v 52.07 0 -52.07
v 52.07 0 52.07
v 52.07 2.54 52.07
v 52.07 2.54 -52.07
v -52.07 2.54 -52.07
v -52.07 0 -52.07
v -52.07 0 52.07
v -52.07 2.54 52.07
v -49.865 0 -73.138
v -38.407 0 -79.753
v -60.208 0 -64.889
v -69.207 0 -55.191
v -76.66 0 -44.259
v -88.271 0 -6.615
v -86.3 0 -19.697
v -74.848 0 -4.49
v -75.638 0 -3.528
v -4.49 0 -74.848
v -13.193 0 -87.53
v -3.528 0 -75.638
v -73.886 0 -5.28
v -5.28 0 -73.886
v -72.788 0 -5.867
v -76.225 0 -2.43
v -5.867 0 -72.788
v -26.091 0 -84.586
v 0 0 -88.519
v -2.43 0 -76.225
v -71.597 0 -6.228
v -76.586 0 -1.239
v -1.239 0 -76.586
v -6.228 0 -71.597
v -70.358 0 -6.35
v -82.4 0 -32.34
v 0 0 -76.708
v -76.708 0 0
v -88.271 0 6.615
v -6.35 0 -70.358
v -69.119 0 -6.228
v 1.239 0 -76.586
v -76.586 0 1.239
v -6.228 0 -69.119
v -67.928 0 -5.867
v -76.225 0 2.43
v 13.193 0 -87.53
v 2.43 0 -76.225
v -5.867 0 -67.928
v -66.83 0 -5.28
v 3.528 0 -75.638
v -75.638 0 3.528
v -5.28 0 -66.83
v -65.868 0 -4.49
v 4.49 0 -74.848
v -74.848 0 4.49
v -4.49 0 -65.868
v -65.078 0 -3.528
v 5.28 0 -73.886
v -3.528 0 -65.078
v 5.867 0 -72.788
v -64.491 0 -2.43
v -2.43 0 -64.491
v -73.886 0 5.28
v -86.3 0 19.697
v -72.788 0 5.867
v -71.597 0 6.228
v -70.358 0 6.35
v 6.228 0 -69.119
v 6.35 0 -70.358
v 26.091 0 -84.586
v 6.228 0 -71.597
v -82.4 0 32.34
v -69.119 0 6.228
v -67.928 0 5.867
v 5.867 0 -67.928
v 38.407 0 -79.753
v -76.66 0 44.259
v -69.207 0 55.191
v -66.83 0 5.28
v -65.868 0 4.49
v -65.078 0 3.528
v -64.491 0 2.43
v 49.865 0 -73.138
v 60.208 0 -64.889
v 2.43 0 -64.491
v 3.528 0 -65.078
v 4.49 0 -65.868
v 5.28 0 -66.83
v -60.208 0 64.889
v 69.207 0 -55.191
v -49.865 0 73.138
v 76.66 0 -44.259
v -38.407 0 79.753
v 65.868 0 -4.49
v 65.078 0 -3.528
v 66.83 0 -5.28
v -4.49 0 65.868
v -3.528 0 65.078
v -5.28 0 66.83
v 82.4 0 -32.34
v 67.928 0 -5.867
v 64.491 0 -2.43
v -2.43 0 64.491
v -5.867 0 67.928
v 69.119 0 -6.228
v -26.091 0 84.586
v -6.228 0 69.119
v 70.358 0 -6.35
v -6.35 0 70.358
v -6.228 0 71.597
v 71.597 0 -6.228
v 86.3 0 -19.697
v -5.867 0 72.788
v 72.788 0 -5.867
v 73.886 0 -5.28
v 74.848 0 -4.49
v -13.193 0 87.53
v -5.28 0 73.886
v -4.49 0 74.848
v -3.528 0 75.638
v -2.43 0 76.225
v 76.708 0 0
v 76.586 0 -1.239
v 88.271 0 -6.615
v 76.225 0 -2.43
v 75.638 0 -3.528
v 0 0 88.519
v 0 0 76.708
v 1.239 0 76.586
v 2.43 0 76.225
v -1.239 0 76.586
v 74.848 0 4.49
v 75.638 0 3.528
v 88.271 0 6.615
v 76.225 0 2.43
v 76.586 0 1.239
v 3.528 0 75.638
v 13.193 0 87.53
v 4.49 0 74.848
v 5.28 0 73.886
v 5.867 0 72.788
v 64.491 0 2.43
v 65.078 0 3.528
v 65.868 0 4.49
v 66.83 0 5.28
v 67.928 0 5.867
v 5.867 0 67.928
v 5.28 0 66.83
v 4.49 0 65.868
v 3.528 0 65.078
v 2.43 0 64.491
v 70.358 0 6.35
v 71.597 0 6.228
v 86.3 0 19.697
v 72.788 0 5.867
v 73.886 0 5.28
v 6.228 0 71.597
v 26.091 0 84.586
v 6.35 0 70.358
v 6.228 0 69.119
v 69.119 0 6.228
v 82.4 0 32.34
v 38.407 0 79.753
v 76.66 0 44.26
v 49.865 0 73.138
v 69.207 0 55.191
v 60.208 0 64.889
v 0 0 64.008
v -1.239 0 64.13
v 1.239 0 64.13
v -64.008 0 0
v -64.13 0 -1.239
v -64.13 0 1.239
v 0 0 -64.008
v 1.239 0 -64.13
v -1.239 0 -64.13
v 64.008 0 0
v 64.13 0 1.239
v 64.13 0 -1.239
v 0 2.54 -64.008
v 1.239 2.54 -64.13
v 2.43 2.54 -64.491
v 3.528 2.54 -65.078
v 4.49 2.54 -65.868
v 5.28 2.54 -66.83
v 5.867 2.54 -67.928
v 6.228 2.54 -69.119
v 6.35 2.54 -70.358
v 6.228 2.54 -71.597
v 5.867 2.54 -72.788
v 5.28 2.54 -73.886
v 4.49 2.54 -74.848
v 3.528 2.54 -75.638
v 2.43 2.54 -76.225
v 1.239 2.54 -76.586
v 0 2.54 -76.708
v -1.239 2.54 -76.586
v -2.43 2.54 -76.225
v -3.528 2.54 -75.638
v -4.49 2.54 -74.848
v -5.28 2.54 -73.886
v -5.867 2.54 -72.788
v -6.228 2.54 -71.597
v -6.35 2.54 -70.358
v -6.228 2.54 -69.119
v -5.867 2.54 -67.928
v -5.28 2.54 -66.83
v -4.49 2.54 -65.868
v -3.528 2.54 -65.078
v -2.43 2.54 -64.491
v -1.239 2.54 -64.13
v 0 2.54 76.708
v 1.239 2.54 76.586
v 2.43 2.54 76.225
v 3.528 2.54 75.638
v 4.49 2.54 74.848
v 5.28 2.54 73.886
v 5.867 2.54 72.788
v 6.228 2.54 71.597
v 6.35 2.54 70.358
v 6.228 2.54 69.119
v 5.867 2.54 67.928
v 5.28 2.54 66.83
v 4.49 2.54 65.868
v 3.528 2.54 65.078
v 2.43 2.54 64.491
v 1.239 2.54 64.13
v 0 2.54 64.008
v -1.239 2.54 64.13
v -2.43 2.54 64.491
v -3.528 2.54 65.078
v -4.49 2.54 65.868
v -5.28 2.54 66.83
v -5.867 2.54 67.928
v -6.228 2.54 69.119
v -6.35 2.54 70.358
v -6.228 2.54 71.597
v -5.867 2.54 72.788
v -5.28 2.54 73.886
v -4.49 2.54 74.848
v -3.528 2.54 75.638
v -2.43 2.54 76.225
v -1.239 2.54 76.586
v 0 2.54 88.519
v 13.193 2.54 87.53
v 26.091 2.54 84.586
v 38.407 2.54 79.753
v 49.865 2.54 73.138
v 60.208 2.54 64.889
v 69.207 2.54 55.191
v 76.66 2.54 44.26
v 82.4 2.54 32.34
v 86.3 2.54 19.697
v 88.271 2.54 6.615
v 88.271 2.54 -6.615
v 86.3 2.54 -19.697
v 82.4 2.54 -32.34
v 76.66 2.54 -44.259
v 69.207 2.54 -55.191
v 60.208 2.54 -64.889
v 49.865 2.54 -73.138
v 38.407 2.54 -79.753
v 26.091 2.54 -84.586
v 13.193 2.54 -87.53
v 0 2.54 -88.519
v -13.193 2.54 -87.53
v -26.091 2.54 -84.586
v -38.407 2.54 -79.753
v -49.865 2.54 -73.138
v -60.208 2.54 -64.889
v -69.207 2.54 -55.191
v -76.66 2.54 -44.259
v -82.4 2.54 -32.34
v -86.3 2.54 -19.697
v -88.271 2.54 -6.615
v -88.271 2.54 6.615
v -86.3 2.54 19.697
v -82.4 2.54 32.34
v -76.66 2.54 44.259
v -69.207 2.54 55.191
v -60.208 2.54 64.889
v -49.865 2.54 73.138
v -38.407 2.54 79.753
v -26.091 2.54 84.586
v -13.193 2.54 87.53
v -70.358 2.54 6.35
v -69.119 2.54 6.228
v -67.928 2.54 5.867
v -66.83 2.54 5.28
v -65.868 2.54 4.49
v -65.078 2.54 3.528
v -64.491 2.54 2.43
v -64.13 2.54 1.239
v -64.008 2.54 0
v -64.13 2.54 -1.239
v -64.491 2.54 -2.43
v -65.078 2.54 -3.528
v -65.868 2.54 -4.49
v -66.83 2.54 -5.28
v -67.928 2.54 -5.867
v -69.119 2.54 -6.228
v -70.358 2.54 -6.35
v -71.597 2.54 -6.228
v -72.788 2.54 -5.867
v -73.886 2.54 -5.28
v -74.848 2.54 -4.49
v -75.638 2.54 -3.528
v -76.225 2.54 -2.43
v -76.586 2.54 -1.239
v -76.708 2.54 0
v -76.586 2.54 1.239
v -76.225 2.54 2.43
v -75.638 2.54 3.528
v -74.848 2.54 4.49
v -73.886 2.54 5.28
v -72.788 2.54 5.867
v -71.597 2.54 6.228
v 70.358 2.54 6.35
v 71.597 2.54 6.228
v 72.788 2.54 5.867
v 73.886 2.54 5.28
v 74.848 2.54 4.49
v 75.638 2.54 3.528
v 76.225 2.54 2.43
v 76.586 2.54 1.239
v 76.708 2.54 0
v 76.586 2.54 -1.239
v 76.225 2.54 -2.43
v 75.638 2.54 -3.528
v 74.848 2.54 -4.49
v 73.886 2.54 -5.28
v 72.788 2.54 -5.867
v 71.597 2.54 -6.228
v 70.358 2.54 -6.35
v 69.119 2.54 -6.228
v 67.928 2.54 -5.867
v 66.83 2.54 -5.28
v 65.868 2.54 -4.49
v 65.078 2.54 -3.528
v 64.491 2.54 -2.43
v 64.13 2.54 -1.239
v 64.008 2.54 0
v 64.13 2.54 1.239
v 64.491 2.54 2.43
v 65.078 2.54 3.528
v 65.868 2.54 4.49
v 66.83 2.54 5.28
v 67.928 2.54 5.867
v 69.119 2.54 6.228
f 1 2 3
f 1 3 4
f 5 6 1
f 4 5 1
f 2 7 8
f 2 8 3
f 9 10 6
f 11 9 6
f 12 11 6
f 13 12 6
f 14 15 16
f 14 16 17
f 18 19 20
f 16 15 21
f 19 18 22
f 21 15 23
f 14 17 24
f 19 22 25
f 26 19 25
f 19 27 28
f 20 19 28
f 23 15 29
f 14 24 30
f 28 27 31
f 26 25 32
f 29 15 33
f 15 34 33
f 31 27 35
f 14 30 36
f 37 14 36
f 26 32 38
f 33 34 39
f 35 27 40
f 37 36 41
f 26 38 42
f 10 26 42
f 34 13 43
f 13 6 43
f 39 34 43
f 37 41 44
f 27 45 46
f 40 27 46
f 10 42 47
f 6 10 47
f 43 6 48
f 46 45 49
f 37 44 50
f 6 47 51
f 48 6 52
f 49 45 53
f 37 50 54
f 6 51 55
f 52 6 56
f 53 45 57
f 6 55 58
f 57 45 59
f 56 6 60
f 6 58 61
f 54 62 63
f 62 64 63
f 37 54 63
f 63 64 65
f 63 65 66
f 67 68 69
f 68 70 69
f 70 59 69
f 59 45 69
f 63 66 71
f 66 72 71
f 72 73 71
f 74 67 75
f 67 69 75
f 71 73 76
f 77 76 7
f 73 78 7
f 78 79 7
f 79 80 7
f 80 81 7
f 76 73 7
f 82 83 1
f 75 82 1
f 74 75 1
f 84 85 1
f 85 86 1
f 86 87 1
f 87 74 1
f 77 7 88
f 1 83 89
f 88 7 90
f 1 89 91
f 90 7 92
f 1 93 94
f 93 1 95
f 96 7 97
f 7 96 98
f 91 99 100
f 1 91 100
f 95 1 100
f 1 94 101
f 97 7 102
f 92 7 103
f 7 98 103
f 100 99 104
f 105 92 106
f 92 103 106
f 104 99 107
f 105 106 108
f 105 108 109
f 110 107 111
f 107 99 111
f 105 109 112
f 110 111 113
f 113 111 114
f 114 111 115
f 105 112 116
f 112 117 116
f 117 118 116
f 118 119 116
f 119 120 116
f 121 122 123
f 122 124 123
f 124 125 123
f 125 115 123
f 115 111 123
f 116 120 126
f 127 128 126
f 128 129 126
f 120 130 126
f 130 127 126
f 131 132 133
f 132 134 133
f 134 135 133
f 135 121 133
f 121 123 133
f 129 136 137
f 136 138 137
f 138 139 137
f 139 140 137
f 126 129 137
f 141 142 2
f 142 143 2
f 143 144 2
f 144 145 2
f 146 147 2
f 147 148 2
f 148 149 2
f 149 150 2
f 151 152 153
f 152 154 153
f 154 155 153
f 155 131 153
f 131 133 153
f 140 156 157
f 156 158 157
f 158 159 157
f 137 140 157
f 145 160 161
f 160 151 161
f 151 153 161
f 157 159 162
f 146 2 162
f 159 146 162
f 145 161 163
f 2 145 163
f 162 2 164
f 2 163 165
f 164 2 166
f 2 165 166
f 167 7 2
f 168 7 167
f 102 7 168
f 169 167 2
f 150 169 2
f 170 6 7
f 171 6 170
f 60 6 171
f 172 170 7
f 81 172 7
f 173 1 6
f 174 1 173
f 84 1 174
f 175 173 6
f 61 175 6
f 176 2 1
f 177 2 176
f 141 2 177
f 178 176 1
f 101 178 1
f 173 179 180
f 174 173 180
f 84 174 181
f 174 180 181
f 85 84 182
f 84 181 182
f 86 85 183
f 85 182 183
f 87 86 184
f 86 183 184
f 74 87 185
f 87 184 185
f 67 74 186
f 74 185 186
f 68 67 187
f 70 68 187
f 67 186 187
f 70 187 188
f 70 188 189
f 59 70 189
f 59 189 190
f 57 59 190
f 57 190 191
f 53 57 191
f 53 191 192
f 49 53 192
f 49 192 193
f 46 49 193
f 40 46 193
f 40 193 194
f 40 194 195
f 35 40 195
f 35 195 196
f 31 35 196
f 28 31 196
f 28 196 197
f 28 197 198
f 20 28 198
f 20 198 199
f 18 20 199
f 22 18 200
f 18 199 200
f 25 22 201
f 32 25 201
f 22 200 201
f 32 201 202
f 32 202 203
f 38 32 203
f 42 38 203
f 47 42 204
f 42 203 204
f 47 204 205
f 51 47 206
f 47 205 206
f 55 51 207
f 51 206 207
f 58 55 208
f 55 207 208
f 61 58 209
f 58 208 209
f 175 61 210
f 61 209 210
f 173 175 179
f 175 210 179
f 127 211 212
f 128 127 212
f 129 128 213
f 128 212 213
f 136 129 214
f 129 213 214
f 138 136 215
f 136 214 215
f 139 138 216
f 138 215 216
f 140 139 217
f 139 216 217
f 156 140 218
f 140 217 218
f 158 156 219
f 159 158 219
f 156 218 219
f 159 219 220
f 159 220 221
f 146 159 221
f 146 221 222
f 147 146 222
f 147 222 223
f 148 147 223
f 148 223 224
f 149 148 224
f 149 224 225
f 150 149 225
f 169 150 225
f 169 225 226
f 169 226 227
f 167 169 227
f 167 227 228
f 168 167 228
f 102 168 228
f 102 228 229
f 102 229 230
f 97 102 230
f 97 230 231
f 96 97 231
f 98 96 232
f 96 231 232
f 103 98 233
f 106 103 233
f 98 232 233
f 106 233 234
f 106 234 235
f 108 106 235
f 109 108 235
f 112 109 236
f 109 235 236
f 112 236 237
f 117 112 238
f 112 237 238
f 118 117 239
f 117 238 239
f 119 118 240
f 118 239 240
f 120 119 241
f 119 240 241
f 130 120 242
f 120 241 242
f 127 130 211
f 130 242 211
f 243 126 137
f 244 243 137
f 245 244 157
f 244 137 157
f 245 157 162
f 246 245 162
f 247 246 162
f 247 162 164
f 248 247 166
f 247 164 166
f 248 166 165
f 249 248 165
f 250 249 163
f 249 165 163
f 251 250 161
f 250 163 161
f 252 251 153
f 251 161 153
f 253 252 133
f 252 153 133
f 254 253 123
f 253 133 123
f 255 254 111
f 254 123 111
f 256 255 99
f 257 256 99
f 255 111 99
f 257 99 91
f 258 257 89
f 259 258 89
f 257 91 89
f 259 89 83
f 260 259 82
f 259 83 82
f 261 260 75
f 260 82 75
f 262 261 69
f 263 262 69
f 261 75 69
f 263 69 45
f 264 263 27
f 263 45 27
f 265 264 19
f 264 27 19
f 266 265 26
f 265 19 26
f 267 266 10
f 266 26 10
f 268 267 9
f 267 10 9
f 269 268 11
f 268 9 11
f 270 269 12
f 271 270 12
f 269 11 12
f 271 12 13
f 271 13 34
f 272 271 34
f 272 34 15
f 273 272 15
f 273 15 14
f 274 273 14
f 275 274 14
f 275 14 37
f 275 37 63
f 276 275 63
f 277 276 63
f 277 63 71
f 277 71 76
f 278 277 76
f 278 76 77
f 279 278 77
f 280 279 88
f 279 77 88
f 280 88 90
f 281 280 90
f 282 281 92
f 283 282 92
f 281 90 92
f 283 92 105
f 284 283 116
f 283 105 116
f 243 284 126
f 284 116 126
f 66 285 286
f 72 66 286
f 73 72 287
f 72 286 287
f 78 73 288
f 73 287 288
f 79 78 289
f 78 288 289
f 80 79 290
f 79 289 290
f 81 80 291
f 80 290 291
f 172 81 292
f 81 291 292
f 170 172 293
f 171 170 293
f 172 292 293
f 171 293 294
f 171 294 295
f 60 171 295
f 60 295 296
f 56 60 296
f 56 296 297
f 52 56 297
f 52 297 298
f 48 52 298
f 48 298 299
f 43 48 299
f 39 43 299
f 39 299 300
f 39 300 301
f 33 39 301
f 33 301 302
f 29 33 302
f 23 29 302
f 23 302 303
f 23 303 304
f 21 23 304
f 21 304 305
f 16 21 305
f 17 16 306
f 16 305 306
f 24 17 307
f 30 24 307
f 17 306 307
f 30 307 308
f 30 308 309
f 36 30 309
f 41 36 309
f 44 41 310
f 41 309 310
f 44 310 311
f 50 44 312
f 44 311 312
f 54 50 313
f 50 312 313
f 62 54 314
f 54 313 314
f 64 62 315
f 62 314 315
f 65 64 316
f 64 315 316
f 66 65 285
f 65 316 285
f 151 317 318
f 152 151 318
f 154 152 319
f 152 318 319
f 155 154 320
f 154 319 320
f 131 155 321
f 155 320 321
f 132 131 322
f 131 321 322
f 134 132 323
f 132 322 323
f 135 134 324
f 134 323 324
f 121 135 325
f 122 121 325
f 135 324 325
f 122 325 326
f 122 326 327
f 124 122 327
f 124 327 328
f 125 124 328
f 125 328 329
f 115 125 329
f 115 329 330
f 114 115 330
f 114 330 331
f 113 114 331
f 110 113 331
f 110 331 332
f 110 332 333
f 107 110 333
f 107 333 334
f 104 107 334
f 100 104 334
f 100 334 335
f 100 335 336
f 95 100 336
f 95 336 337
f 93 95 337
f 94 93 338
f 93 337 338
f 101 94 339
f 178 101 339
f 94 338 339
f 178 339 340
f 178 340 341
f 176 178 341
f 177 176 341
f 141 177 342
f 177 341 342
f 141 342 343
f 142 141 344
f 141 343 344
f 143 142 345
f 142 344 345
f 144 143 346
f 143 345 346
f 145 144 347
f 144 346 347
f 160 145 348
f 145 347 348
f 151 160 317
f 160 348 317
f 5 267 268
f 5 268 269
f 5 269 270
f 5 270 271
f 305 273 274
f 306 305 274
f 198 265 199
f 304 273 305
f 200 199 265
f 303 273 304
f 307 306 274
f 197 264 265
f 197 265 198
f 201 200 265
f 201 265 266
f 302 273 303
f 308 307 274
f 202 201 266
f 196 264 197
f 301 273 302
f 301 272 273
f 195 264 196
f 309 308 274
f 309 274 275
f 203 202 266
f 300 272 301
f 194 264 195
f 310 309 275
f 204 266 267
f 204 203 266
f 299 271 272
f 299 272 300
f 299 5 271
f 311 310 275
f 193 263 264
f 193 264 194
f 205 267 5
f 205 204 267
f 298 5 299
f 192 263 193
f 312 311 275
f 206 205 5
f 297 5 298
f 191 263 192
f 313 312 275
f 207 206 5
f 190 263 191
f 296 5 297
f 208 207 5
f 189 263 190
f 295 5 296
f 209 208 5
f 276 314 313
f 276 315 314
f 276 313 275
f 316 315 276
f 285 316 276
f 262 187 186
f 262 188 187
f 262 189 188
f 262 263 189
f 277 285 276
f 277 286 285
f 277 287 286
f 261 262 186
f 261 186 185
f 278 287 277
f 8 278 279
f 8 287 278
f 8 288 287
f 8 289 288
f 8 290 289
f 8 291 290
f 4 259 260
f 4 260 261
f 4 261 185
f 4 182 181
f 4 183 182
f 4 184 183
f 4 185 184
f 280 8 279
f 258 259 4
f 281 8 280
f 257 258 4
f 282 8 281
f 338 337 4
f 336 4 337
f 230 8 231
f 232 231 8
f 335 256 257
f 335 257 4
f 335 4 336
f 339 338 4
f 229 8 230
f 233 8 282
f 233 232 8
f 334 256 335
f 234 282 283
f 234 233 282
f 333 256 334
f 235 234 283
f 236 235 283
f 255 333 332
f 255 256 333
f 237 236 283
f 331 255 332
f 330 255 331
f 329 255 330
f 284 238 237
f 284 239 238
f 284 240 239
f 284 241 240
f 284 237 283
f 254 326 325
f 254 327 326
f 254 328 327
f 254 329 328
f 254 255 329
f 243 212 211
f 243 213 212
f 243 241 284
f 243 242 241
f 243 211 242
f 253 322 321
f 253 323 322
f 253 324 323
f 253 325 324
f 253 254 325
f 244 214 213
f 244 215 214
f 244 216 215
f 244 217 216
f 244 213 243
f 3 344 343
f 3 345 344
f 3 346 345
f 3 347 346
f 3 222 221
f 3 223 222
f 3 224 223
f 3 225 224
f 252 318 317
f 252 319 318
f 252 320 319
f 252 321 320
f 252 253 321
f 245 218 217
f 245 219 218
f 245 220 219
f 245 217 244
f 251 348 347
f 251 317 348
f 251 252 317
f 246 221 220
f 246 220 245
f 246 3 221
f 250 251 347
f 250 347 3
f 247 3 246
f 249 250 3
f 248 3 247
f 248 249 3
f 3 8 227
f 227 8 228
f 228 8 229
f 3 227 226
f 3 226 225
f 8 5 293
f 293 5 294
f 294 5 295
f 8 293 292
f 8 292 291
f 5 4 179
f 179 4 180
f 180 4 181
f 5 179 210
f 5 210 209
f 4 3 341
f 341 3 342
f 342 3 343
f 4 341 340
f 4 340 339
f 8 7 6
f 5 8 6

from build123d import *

# Parameters (mm, degrees)
SKETCH1_R           = 88.519
SKETCH1_W           = 104.14
SKETCH1_H           = 104.14
BOSS_EXTRUDE1_DEPTH = 2.54
SKETCH2_R           = 6.35
CUT_EXTRUDE1_DEPTH  = 126.210535986


with BuildPart() as part:
    # Sketch1 → Boss-Extrude1 (new body)
    with BuildSketch(Plane(origin=(0, 0, 0), x_dir=(1, 0, 0), z_dir=(0, 1, 0))):
        with Locations(Location((0, 0, 0), (0, 0, 270))):
            Circle(SKETCH1_R)
        Rectangle(SKETCH1_W, SKETCH1_H, mode=Mode.SUBTRACT)
    extrude(amount=BOSS_EXTRUDE1_DEPTH)

    # Sketch2 → Cut-Extrude1 (cut, through all)
    with BuildSketch(Plane(origin=(0, 2.54, 0), x_dir=(1, 0, 0), z_dir=(0, 1, 0))):
        with Locations(Location((0, 70.358, 0), (0, 0, 270))):
            Circle(SKETCH2_R)
        with Locations(Location((70.358, 0, 0), (0, 0, 270))):
            Circle(SKETCH2_R)
        with Locations(Location((0, -70.358, 0), (0, 0, 270))):
            Circle(SKETCH2_R)
        with Locations(Location((-70.358, 0, 0), (0, 0, 270))):
            Circle(SKETCH2_R)
    extrude(amount=-CUT_EXTRUDE1_DEPTH, mode=Mode.SUBTRACT)


solid = part.part
